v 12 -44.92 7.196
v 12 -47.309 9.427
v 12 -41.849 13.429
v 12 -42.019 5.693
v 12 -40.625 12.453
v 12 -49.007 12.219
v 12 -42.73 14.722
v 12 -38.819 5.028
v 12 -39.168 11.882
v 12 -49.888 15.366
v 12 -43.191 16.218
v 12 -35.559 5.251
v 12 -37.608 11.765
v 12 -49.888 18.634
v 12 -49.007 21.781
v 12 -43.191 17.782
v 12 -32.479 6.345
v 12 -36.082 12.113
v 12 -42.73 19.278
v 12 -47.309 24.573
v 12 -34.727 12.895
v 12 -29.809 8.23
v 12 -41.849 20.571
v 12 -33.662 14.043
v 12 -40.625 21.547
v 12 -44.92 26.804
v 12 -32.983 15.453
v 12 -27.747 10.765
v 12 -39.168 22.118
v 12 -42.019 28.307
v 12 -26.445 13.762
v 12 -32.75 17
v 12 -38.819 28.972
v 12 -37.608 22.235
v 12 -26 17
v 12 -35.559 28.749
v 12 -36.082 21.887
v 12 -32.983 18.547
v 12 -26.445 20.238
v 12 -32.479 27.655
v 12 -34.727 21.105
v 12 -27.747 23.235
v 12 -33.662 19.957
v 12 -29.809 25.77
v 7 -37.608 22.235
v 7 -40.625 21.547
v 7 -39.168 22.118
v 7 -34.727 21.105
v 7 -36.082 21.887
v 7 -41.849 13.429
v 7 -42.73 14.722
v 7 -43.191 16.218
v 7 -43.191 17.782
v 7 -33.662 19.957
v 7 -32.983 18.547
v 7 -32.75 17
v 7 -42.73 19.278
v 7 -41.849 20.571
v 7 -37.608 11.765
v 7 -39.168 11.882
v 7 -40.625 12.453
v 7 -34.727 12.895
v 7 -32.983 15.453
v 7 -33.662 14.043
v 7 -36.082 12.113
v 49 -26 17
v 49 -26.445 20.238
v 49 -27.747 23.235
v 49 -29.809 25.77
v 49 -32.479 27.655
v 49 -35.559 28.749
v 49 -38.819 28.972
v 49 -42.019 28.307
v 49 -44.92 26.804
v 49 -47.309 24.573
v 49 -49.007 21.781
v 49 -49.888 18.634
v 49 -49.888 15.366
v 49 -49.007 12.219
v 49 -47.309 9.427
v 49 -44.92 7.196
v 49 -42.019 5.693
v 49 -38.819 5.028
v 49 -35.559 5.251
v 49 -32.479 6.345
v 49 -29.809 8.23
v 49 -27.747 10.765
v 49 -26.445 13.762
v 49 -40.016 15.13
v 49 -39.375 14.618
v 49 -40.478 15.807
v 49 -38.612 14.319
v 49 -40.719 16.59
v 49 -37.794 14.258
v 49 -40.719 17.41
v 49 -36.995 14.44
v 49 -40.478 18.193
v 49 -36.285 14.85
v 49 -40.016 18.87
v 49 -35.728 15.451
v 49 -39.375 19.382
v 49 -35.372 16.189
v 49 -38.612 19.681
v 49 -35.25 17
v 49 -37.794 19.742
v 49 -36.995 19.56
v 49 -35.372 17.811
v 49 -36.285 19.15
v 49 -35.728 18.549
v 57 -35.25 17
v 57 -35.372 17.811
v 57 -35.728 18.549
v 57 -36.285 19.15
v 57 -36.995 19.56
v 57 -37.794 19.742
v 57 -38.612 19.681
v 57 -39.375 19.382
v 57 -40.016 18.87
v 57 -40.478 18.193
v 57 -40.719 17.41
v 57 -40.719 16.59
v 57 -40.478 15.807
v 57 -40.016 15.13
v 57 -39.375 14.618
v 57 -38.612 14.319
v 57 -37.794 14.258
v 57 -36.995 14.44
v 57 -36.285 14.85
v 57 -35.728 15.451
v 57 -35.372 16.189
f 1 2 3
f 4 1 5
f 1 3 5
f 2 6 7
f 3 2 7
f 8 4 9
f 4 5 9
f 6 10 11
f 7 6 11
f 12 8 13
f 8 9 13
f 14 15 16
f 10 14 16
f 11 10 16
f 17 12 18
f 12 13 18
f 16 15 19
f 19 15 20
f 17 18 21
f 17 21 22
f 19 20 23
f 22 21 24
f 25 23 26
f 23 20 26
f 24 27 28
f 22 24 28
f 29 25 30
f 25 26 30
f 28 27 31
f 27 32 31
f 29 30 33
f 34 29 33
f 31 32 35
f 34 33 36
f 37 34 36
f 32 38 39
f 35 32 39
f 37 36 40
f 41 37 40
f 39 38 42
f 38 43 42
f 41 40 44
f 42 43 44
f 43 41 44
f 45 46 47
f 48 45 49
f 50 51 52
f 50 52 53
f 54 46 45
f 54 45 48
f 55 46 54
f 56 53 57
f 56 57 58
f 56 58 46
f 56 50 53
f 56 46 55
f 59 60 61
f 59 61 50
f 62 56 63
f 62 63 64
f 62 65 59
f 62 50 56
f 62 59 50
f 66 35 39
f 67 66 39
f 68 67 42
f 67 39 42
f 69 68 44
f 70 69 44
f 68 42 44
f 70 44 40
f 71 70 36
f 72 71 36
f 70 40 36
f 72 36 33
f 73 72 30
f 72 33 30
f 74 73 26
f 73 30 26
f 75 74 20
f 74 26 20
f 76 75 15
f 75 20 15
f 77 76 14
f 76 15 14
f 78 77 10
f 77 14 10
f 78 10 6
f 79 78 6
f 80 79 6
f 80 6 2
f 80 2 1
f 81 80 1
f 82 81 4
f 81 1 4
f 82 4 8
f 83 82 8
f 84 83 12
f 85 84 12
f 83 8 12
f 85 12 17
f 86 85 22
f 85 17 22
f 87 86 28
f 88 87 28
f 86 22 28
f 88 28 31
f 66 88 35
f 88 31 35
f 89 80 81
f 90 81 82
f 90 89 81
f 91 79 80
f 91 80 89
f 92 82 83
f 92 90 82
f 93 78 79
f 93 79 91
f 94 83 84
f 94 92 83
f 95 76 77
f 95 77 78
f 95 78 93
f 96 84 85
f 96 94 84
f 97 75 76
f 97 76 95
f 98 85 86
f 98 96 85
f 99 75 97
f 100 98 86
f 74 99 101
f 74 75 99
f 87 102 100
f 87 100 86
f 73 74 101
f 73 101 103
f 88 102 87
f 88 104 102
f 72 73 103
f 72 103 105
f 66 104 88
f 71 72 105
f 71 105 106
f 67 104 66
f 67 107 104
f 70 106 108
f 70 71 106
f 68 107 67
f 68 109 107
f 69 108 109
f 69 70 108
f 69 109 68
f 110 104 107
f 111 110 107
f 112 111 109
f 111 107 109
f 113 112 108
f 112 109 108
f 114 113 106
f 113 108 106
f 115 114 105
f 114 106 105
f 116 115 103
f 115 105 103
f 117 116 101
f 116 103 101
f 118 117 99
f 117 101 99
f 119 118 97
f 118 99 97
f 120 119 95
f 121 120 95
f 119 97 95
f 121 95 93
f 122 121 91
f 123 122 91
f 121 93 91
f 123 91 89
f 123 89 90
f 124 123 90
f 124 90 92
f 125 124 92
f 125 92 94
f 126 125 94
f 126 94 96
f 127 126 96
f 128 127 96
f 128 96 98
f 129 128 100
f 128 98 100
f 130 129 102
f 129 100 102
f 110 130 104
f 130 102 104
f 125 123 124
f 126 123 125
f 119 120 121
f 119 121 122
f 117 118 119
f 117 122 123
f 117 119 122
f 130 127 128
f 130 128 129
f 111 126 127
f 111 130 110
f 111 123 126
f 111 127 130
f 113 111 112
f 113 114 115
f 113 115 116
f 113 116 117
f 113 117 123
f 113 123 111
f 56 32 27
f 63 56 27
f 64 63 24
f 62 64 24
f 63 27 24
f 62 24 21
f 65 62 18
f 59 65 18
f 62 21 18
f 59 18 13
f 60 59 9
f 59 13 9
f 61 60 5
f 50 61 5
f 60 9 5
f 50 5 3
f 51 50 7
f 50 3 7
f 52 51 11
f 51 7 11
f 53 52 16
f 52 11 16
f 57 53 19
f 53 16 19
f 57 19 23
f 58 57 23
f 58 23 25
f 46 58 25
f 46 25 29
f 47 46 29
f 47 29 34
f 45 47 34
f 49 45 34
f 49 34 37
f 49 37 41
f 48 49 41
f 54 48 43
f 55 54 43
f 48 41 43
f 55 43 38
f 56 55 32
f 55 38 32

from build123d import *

# Parameters (mm, degrees)
SKETCH005_R  = 12
PAD004_DEPTH = 37
SKETCH006_R  = 2.75
PAD005_DEPTH = 8
SKETCH007_R  = 5.25
PAD006_DEPTH = 5


with BuildPart() as part:
    # Sketch005 → Pad004 (new body)
    with BuildSketch(Plane.YZ):
        Circle(SKETCH005_R)
    extrude(amount=PAD004_DEPTH)

    # Sketch006 (on Face3 of Pad004) → Pad005 (join)
    with BuildSketch(Plane.YZ.offset(37)):
        Circle(SKETCH006_R)
    extrude(amount=PAD005_DEPTH)

    # Sketch007 (on Face2 of Pad005) → Pad006 (join)
    with BuildSketch(Plane(origin=(0, 0, 0), x_dir=(0, 1, 0), z_dir=(-1, 0, 0))):
        Circle(SKETCH007_R)
    extrude(amount=PAD006_DEPTH)


with BuildPart() as part_1:
    # Body002 placement: moved
    add(part.part.moved(Location((12, -38, 17))))


solid = part_1.part
